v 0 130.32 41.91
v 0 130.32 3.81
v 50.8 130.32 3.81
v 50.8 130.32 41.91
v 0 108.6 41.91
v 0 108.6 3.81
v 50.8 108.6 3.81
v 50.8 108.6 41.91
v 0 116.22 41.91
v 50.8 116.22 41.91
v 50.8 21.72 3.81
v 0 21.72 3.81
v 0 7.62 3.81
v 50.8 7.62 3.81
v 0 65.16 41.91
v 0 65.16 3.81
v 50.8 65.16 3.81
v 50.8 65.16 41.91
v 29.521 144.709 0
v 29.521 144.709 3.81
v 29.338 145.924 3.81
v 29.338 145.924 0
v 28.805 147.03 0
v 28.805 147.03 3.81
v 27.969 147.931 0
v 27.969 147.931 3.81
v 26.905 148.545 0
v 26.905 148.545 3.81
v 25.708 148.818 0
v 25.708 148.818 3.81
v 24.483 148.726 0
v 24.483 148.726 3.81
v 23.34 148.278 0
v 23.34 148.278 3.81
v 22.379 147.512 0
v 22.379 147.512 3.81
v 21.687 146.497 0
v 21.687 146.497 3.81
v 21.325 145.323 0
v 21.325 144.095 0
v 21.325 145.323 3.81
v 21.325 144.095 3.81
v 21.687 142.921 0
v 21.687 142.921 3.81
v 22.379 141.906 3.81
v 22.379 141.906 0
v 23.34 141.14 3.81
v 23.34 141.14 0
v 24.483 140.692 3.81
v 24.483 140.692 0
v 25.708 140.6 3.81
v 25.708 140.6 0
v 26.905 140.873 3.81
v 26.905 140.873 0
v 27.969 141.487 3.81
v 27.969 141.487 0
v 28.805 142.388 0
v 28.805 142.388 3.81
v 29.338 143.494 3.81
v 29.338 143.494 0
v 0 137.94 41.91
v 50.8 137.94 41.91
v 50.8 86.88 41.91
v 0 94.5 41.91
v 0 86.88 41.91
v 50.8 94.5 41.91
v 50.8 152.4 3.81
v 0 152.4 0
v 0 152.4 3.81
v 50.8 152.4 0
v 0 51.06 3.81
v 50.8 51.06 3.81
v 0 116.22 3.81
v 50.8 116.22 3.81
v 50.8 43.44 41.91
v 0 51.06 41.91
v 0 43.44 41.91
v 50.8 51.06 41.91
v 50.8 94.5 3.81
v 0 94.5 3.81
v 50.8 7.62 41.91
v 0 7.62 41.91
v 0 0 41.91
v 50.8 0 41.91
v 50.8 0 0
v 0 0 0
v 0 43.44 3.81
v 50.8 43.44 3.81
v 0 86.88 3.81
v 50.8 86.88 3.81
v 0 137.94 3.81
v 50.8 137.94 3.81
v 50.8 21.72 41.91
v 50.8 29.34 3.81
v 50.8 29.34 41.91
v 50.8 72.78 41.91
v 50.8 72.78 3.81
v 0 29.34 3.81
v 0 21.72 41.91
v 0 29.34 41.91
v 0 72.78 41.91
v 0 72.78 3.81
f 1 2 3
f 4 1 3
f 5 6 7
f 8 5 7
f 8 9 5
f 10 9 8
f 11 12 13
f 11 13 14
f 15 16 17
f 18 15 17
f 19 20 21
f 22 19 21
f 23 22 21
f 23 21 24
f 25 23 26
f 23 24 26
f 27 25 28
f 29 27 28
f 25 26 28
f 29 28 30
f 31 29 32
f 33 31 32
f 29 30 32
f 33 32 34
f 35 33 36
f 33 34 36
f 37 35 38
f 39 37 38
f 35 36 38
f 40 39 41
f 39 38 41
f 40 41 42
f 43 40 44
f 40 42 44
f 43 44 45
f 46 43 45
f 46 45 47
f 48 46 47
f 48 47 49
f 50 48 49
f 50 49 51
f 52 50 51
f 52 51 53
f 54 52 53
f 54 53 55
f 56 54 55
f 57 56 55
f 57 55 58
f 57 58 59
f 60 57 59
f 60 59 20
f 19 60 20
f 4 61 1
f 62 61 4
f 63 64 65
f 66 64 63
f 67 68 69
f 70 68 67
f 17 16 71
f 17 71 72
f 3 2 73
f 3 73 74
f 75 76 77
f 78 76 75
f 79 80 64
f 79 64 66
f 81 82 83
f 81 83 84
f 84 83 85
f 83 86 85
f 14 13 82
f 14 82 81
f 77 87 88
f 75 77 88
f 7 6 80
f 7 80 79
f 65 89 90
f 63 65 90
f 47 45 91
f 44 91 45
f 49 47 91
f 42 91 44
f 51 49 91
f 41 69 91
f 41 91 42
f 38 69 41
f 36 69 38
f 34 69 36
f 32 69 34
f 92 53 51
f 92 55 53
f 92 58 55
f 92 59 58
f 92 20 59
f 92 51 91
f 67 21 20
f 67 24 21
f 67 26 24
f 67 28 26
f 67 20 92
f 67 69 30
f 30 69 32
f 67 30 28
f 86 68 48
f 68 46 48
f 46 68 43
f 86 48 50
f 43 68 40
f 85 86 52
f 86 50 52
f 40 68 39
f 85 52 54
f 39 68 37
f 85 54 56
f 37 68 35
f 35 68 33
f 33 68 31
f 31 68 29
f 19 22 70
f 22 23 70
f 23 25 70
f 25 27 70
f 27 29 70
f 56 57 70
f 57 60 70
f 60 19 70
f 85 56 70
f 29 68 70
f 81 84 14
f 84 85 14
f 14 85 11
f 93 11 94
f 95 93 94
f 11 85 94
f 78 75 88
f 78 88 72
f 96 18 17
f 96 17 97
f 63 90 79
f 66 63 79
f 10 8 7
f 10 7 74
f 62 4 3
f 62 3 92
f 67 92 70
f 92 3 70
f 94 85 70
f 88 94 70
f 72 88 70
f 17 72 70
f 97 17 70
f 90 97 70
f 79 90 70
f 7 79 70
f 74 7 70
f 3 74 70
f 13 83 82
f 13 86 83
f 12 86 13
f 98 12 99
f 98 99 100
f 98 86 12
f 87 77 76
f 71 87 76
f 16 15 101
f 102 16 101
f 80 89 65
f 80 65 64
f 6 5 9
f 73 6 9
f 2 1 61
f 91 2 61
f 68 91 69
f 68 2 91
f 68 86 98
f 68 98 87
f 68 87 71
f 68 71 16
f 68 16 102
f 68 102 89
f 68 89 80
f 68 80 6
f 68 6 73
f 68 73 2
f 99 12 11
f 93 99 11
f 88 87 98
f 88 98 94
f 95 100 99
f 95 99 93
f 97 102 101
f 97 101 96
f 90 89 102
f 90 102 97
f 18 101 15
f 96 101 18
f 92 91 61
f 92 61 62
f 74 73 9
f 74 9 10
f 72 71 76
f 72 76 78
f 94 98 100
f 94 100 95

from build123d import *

# Parameters (mm, degrees)
F0_W     = 50.8
F0_H     = 152.4
F1_DEPTH = 3.81
F2_W     = 50.8
F2_H     = 7.62
F3_DEPTH = 38.1
F4_R     = 4.120653
F5_DEPTH = 25.4


with BuildPart() as f1:
    # F0 (on Top) → F1 (new body)
    with BuildSketch(Plane.XY):
        with Locations((25.4, 76.2)):
            Rectangle(F0_W, F0_H)
    extrude(amount=F1_DEPTH)

    # F2 (on face) → F3 (join)
    with BuildSketch(Plane.XY.offset(3.81)):
        with Locations((25.4, 134.13)):
            Rectangle(F2_W, F2_H)
        with Locations((25.4, 112.41)):
            Rectangle(F2_W, F2_H)
        with Locations((25.4, 90.69)):
            Rectangle(F2_W, F2_H)
        with Locations((25.4, 68.97)):
            Rectangle(F2_W, F2_H)
        with Locations((25.4, 47.25)):
            Rectangle(F2_W, F2_H)
        with Locations((25.4, 3.81)):
            Rectangle(F2_W, F2_H)
        with Locations((25.4, 25.53)):
            Rectangle(F2_W, F2_H)
    extrude(amount=F3_DEPTH)

    # F4 (on face) → F5 (cut)
    with BuildSketch(Plane.XY.offset(3.81)):
        with Locations((25.4, 144.709066)):
            Circle(F4_R)
    extrude(amount=-F5_DEPTH, mode=Mode.SUBTRACT)


solid = f1.part
